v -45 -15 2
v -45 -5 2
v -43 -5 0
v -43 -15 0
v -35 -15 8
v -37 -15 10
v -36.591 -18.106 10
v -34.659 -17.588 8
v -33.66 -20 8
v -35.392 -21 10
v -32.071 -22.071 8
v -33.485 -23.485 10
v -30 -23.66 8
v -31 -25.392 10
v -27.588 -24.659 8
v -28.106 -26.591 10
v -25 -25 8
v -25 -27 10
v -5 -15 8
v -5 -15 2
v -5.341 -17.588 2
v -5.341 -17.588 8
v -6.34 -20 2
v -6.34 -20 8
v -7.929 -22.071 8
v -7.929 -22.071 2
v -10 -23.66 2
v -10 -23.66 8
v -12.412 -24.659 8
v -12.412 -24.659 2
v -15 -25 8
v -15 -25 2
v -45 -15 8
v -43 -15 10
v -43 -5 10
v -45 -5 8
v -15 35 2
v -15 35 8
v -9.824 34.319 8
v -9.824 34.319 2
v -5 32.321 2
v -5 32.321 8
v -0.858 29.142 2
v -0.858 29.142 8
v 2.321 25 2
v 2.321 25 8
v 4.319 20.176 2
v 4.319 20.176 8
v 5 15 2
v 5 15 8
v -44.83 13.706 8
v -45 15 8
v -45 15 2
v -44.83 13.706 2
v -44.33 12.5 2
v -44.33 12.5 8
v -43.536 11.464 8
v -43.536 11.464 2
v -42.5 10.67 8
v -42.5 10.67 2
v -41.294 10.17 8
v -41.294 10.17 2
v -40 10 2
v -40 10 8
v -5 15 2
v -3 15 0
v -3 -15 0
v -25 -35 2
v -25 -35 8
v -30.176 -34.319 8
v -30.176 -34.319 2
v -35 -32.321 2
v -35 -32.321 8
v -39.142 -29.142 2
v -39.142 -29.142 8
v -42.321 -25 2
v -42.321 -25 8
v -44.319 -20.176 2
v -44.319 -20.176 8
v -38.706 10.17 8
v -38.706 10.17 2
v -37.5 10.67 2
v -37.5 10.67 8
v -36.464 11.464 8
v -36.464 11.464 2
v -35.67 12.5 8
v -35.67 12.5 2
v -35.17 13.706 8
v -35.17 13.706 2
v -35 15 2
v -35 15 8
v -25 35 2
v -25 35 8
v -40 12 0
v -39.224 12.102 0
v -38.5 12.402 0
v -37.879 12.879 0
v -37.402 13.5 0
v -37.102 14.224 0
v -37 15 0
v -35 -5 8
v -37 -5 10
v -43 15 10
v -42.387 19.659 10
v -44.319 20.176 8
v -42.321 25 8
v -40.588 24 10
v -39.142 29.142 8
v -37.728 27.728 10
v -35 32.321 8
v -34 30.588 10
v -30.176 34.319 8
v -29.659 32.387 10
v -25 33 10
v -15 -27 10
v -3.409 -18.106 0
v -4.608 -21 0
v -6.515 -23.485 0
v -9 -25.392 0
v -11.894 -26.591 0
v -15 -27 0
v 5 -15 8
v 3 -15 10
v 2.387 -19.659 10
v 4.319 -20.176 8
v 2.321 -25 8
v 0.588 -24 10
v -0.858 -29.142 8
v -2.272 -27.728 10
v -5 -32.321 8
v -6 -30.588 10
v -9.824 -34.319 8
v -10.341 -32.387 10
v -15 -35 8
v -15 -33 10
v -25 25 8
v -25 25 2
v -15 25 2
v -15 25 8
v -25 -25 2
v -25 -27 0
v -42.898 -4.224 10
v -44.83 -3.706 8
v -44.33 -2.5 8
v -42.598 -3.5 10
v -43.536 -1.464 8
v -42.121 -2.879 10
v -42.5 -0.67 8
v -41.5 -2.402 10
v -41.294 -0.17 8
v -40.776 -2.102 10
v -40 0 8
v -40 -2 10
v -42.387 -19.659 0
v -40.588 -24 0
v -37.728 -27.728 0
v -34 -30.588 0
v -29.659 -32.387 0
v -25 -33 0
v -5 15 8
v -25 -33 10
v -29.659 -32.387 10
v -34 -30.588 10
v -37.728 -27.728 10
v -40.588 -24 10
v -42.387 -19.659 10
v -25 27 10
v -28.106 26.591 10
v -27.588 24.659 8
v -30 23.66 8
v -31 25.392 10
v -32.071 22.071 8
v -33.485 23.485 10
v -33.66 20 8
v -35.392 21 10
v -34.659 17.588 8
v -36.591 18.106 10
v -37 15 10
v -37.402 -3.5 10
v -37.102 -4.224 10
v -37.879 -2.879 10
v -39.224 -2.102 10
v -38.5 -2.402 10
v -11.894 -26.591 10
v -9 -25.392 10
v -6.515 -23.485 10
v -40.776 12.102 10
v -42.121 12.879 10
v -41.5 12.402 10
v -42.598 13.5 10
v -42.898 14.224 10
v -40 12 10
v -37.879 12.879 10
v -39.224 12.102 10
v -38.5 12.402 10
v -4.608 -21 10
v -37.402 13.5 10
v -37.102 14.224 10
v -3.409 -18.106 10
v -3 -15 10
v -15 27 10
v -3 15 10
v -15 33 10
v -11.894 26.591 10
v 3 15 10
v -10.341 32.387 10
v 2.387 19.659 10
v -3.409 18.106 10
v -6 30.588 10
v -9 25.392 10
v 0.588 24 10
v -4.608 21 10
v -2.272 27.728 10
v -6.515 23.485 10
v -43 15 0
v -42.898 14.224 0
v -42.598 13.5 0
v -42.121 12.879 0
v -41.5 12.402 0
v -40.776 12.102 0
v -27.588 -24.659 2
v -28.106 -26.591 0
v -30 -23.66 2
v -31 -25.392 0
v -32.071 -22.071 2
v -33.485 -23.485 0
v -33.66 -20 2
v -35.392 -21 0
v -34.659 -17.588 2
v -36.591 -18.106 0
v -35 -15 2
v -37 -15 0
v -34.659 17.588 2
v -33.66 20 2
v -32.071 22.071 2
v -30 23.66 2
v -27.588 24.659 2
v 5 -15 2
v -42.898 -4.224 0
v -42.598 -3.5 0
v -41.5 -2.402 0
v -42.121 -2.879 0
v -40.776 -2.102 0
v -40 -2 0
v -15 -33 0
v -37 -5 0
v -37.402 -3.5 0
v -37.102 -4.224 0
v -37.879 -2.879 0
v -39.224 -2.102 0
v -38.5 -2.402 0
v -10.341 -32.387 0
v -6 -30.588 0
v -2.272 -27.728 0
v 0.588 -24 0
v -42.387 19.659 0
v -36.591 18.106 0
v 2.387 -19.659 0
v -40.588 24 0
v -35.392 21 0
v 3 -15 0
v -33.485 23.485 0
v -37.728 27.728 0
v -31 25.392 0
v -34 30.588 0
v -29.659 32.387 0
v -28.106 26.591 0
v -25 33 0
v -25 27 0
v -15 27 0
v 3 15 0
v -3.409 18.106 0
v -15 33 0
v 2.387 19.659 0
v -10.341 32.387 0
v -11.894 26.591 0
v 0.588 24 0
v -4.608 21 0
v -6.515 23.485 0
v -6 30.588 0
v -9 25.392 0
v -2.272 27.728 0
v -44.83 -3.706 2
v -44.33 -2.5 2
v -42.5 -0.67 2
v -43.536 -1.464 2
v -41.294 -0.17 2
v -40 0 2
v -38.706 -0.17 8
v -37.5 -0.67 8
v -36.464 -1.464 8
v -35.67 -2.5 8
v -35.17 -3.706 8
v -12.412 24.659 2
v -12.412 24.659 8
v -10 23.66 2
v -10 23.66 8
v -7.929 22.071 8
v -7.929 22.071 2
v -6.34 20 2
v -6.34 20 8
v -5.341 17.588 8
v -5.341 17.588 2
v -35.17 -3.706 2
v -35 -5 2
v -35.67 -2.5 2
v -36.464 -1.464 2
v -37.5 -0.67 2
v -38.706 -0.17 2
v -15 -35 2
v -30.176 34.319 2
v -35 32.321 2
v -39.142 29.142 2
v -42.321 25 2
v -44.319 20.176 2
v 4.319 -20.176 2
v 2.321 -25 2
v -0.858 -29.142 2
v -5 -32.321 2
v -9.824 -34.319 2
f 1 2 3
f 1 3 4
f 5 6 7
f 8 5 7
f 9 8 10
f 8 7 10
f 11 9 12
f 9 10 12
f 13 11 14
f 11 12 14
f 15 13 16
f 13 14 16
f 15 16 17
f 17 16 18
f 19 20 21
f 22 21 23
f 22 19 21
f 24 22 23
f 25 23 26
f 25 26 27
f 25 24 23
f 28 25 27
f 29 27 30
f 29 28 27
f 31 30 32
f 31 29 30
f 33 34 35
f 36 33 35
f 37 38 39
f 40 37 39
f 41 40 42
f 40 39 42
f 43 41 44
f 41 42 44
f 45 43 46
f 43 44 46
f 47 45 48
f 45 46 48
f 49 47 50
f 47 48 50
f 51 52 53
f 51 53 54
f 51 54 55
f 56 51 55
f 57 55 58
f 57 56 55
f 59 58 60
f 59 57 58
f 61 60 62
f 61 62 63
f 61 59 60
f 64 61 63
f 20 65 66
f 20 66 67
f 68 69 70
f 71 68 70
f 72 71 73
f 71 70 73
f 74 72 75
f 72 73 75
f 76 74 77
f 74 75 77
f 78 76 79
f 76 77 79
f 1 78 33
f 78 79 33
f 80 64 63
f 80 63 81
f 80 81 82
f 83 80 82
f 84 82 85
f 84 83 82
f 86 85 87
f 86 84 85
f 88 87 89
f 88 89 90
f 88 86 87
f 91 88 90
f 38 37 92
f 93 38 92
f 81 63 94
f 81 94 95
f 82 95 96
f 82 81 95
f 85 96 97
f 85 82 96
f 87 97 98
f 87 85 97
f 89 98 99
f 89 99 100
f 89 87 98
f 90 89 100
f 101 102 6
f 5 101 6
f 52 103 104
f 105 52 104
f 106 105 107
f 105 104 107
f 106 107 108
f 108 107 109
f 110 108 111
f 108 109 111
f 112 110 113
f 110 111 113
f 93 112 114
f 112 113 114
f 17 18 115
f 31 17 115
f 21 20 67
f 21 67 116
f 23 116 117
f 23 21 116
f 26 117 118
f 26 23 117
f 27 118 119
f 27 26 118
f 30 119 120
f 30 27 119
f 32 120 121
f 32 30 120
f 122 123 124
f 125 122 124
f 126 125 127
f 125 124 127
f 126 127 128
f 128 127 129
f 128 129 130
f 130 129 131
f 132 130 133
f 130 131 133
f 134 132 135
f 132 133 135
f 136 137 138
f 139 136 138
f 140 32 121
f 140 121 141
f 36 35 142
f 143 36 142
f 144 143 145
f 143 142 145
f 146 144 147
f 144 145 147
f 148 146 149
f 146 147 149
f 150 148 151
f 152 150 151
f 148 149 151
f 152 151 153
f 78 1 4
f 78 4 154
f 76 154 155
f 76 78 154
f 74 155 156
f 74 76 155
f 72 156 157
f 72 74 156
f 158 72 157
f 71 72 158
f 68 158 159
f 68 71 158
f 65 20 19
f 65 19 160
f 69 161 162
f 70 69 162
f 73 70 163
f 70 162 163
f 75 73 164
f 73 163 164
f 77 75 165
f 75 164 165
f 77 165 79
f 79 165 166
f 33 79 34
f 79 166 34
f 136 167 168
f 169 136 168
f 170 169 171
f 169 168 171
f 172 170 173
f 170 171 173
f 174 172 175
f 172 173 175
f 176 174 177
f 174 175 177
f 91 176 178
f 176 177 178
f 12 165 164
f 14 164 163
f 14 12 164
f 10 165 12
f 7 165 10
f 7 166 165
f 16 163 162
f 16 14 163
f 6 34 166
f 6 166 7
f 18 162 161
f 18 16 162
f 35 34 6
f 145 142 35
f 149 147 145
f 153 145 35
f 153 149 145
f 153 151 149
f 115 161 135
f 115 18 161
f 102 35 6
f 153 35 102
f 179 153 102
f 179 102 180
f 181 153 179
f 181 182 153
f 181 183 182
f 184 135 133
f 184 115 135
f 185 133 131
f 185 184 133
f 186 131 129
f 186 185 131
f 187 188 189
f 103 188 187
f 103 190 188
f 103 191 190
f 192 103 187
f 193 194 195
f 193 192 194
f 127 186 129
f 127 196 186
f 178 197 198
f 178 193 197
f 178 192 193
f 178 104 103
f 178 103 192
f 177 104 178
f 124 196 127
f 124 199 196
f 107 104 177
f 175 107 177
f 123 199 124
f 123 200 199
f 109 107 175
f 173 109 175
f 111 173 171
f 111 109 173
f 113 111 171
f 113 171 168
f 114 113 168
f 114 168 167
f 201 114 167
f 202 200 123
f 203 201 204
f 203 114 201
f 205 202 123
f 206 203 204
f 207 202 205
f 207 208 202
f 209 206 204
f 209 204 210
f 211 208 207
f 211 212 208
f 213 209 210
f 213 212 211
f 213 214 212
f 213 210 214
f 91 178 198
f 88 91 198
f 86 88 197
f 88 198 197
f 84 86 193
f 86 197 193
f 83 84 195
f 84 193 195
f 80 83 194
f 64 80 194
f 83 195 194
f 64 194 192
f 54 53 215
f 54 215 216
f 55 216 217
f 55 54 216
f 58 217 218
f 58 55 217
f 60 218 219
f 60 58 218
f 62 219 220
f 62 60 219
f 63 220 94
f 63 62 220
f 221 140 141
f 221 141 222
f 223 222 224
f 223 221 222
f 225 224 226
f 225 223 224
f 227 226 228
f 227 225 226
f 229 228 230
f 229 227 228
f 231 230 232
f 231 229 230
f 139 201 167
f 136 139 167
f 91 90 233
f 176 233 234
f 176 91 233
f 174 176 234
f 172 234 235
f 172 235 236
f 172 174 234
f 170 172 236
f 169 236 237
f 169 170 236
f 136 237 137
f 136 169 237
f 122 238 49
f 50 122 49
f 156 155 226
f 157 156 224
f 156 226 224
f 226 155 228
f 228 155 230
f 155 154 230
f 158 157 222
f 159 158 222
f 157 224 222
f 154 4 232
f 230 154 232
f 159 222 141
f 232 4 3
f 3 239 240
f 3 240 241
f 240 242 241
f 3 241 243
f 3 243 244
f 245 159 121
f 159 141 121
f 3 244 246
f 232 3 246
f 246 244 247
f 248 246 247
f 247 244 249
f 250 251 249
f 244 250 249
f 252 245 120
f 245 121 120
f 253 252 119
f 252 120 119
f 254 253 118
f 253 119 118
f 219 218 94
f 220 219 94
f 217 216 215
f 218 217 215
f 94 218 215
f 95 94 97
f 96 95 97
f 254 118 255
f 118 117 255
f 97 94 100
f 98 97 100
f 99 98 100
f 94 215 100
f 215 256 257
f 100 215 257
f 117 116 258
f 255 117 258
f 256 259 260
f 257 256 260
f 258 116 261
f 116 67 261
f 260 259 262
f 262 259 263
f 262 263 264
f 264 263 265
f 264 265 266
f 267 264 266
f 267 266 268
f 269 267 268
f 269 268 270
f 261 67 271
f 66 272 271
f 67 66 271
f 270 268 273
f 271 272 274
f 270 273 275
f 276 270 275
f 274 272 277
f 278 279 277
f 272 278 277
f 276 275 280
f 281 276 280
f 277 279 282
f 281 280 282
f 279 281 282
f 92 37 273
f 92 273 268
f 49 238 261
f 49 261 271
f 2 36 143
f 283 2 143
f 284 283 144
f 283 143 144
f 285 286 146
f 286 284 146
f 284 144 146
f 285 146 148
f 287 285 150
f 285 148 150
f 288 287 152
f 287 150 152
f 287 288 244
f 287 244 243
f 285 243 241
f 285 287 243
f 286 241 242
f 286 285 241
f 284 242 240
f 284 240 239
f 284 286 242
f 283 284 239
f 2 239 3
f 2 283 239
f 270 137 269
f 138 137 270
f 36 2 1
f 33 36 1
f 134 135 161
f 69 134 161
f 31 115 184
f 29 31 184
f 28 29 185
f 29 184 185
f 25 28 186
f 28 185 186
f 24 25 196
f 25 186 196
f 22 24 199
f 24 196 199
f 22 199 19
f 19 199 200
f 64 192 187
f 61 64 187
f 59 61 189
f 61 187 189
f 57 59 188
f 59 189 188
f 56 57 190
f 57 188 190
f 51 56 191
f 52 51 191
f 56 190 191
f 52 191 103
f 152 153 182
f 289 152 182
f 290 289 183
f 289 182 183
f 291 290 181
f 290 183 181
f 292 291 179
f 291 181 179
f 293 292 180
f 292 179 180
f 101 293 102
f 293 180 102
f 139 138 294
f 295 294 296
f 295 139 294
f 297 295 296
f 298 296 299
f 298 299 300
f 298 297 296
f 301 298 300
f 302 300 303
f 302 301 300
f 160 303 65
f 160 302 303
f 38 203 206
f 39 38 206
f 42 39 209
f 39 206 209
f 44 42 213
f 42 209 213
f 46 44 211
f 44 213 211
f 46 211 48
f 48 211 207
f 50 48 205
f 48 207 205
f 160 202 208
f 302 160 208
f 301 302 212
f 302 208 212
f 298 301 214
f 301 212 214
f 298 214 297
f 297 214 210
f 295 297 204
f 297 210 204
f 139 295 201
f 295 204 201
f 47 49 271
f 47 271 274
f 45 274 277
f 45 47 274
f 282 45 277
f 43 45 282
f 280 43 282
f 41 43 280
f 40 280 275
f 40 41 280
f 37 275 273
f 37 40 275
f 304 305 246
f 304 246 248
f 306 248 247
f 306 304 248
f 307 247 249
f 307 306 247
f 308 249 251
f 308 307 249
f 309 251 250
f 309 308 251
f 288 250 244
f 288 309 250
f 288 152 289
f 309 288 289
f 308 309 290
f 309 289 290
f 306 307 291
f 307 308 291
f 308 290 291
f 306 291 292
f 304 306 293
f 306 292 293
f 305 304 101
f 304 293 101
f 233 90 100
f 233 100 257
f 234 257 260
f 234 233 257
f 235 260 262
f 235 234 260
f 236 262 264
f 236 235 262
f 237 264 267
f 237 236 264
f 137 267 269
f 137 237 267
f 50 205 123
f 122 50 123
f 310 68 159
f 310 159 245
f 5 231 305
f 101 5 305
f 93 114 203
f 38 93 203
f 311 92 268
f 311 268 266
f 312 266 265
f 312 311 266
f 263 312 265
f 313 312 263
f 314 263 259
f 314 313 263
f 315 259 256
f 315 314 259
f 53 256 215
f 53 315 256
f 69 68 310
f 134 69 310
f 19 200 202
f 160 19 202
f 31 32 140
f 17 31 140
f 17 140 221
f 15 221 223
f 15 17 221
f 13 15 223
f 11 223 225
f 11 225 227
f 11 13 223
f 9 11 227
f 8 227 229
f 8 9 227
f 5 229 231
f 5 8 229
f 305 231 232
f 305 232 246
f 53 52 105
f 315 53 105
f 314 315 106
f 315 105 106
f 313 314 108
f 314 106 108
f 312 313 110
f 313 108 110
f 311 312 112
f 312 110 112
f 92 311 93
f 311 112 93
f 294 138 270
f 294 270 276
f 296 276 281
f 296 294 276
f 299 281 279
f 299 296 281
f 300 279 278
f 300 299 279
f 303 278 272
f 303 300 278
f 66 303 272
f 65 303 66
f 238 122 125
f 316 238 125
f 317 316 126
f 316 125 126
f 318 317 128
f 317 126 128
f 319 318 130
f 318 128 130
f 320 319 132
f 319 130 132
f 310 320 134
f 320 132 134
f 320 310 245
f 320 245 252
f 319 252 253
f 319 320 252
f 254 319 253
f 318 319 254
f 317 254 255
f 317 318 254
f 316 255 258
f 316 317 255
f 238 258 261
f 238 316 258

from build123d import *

# Parameters (mm, degrees)
F0_W     = 10
F0_H     = 15
F0_H_2   = 50
F0_H_3   = 25
F1_DEPTH = 10
F2_R     = 10
F3_R     = 20
F4_R     = 4.99999
F5_SIZE  = 2


# Not quite as in the source:
# - a fillet or chamfer is up to 0.001 mm smaller than in the source, because OpenCascade refuses the exact size


with BuildPart() as f1:
    # F0 (on Top) → F1 (new body)
    with BuildSketch(Plane.XY):
        with Locations((-40, 17.5)):
            Rectangle(F0_W, F0_H)
        Polygon((-35, 25), (-5, 25), (5, 25), (5, 35), (-45, 35), (-45, 25), align=None)
        Rectangle(F0_W, F0_H_2)
        Polygon((5, -25), (-5, -25), (-35, -25), (-45, -25), (-45, -35), (5, -35), align=None)
        with Locations((-40, -12.5)):
            Rectangle(F0_W, F0_H_3)
    extrude(amount=F1_DEPTH)

    # F2
    f2_edges = [f1.edges().sort_by_distance(p)[0] for p in [
        (-35, 25, 5),
        (-5, 25, 5),
        (-5, -25, 5),
        (-35, -25, 5),
    ]]
    fillet(f2_edges, radius=F2_R)

    # F3
    f3_edges = [f1.edges().sort_by_distance(p)[0] for p in [
        (5, 35, 5),
        (-45, 35, 5),
        (5, -35, 5),
        (-45, -35, 5),
    ]]
    fillet(f3_edges, radius=F3_R)

    # F4 (radius 5 in the source; OpenCascade refuses exactly that, so slightly less here)
    f4_edges = [f1.edges().sort_by_distance(p)[0] for p in [
        (-35, 10, 5),
        (-45, 10, 5),
        (-45, 0, 5),
        (-35, 0, 5),
    ]]
    fillet(f4_edges, radius=F4_R)

    # F5
    f5_edges = [f1.edges().sort_by_distance(p)[0] for p in [
        (-45, -9.999995, 0),
        (-39.142136, -29.142136, 10),
    ]]
    chamfer(f5_edges, length=F5_SIZE)


solid = f1.part
